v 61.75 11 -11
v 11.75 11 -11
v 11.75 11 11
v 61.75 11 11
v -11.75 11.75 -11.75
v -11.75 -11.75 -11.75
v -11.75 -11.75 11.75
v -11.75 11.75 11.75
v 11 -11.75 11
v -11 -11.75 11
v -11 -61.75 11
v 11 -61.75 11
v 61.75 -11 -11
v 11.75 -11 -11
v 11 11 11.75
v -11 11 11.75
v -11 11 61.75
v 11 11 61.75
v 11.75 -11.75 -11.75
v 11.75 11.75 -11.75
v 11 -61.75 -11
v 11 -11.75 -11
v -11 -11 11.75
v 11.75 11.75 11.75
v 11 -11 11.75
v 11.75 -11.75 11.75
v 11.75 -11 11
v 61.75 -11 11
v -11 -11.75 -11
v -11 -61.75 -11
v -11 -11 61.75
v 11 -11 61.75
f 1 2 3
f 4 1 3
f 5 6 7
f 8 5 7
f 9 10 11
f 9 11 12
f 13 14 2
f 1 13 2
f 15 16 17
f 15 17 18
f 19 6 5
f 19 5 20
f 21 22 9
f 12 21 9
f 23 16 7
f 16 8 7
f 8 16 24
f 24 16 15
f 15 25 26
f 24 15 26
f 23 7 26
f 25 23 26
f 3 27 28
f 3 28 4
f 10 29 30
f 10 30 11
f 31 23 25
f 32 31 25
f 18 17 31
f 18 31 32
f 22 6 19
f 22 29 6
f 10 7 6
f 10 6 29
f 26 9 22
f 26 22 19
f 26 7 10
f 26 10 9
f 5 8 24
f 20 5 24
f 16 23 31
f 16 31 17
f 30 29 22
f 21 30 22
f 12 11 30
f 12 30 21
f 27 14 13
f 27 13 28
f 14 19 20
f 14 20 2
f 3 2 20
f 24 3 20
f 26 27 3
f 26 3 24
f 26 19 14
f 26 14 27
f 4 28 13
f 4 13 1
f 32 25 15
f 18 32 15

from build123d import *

# Parameters (mm, degrees)
F0_W     = 23.5
F0_H     = 23.5
F1_DEPTH = 11.75
F2_W     = 22
F2_H     = 22
F3_DEPTH = 50
F4_W     = 22
F4_H     = 22
F5_DEPTH = 50
F6_W     = 22
F6_H     = 22
F7_DEPTH = 50


with BuildPart() as f1:
    # F0 (on Front) → F1 (new body, symmetric)
    with BuildSketch(Plane.XZ):
        Rectangle(F0_W, F0_H)
    extrude(amount=F1_DEPTH, both=True)

    # F2 (on face) → F3 (join)
    with BuildSketch(Plane.XZ.offset(11.75)):
        Rectangle(F2_W, F2_H)
    extrude(amount=F3_DEPTH)

    # F4 (on face) → F5 (join)
    with BuildSketch(Plane.XY.offset(11.75)):
        Rectangle(F4_W, F4_H)
    extrude(amount=F5_DEPTH)

    # F6 (on face) → F7 (join)
    with BuildSketch(Plane.YZ.offset(11.75)):
        Rectangle(F6_W, F6_H)
    extrude(amount=F7_DEPTH)


solid = f1.part
